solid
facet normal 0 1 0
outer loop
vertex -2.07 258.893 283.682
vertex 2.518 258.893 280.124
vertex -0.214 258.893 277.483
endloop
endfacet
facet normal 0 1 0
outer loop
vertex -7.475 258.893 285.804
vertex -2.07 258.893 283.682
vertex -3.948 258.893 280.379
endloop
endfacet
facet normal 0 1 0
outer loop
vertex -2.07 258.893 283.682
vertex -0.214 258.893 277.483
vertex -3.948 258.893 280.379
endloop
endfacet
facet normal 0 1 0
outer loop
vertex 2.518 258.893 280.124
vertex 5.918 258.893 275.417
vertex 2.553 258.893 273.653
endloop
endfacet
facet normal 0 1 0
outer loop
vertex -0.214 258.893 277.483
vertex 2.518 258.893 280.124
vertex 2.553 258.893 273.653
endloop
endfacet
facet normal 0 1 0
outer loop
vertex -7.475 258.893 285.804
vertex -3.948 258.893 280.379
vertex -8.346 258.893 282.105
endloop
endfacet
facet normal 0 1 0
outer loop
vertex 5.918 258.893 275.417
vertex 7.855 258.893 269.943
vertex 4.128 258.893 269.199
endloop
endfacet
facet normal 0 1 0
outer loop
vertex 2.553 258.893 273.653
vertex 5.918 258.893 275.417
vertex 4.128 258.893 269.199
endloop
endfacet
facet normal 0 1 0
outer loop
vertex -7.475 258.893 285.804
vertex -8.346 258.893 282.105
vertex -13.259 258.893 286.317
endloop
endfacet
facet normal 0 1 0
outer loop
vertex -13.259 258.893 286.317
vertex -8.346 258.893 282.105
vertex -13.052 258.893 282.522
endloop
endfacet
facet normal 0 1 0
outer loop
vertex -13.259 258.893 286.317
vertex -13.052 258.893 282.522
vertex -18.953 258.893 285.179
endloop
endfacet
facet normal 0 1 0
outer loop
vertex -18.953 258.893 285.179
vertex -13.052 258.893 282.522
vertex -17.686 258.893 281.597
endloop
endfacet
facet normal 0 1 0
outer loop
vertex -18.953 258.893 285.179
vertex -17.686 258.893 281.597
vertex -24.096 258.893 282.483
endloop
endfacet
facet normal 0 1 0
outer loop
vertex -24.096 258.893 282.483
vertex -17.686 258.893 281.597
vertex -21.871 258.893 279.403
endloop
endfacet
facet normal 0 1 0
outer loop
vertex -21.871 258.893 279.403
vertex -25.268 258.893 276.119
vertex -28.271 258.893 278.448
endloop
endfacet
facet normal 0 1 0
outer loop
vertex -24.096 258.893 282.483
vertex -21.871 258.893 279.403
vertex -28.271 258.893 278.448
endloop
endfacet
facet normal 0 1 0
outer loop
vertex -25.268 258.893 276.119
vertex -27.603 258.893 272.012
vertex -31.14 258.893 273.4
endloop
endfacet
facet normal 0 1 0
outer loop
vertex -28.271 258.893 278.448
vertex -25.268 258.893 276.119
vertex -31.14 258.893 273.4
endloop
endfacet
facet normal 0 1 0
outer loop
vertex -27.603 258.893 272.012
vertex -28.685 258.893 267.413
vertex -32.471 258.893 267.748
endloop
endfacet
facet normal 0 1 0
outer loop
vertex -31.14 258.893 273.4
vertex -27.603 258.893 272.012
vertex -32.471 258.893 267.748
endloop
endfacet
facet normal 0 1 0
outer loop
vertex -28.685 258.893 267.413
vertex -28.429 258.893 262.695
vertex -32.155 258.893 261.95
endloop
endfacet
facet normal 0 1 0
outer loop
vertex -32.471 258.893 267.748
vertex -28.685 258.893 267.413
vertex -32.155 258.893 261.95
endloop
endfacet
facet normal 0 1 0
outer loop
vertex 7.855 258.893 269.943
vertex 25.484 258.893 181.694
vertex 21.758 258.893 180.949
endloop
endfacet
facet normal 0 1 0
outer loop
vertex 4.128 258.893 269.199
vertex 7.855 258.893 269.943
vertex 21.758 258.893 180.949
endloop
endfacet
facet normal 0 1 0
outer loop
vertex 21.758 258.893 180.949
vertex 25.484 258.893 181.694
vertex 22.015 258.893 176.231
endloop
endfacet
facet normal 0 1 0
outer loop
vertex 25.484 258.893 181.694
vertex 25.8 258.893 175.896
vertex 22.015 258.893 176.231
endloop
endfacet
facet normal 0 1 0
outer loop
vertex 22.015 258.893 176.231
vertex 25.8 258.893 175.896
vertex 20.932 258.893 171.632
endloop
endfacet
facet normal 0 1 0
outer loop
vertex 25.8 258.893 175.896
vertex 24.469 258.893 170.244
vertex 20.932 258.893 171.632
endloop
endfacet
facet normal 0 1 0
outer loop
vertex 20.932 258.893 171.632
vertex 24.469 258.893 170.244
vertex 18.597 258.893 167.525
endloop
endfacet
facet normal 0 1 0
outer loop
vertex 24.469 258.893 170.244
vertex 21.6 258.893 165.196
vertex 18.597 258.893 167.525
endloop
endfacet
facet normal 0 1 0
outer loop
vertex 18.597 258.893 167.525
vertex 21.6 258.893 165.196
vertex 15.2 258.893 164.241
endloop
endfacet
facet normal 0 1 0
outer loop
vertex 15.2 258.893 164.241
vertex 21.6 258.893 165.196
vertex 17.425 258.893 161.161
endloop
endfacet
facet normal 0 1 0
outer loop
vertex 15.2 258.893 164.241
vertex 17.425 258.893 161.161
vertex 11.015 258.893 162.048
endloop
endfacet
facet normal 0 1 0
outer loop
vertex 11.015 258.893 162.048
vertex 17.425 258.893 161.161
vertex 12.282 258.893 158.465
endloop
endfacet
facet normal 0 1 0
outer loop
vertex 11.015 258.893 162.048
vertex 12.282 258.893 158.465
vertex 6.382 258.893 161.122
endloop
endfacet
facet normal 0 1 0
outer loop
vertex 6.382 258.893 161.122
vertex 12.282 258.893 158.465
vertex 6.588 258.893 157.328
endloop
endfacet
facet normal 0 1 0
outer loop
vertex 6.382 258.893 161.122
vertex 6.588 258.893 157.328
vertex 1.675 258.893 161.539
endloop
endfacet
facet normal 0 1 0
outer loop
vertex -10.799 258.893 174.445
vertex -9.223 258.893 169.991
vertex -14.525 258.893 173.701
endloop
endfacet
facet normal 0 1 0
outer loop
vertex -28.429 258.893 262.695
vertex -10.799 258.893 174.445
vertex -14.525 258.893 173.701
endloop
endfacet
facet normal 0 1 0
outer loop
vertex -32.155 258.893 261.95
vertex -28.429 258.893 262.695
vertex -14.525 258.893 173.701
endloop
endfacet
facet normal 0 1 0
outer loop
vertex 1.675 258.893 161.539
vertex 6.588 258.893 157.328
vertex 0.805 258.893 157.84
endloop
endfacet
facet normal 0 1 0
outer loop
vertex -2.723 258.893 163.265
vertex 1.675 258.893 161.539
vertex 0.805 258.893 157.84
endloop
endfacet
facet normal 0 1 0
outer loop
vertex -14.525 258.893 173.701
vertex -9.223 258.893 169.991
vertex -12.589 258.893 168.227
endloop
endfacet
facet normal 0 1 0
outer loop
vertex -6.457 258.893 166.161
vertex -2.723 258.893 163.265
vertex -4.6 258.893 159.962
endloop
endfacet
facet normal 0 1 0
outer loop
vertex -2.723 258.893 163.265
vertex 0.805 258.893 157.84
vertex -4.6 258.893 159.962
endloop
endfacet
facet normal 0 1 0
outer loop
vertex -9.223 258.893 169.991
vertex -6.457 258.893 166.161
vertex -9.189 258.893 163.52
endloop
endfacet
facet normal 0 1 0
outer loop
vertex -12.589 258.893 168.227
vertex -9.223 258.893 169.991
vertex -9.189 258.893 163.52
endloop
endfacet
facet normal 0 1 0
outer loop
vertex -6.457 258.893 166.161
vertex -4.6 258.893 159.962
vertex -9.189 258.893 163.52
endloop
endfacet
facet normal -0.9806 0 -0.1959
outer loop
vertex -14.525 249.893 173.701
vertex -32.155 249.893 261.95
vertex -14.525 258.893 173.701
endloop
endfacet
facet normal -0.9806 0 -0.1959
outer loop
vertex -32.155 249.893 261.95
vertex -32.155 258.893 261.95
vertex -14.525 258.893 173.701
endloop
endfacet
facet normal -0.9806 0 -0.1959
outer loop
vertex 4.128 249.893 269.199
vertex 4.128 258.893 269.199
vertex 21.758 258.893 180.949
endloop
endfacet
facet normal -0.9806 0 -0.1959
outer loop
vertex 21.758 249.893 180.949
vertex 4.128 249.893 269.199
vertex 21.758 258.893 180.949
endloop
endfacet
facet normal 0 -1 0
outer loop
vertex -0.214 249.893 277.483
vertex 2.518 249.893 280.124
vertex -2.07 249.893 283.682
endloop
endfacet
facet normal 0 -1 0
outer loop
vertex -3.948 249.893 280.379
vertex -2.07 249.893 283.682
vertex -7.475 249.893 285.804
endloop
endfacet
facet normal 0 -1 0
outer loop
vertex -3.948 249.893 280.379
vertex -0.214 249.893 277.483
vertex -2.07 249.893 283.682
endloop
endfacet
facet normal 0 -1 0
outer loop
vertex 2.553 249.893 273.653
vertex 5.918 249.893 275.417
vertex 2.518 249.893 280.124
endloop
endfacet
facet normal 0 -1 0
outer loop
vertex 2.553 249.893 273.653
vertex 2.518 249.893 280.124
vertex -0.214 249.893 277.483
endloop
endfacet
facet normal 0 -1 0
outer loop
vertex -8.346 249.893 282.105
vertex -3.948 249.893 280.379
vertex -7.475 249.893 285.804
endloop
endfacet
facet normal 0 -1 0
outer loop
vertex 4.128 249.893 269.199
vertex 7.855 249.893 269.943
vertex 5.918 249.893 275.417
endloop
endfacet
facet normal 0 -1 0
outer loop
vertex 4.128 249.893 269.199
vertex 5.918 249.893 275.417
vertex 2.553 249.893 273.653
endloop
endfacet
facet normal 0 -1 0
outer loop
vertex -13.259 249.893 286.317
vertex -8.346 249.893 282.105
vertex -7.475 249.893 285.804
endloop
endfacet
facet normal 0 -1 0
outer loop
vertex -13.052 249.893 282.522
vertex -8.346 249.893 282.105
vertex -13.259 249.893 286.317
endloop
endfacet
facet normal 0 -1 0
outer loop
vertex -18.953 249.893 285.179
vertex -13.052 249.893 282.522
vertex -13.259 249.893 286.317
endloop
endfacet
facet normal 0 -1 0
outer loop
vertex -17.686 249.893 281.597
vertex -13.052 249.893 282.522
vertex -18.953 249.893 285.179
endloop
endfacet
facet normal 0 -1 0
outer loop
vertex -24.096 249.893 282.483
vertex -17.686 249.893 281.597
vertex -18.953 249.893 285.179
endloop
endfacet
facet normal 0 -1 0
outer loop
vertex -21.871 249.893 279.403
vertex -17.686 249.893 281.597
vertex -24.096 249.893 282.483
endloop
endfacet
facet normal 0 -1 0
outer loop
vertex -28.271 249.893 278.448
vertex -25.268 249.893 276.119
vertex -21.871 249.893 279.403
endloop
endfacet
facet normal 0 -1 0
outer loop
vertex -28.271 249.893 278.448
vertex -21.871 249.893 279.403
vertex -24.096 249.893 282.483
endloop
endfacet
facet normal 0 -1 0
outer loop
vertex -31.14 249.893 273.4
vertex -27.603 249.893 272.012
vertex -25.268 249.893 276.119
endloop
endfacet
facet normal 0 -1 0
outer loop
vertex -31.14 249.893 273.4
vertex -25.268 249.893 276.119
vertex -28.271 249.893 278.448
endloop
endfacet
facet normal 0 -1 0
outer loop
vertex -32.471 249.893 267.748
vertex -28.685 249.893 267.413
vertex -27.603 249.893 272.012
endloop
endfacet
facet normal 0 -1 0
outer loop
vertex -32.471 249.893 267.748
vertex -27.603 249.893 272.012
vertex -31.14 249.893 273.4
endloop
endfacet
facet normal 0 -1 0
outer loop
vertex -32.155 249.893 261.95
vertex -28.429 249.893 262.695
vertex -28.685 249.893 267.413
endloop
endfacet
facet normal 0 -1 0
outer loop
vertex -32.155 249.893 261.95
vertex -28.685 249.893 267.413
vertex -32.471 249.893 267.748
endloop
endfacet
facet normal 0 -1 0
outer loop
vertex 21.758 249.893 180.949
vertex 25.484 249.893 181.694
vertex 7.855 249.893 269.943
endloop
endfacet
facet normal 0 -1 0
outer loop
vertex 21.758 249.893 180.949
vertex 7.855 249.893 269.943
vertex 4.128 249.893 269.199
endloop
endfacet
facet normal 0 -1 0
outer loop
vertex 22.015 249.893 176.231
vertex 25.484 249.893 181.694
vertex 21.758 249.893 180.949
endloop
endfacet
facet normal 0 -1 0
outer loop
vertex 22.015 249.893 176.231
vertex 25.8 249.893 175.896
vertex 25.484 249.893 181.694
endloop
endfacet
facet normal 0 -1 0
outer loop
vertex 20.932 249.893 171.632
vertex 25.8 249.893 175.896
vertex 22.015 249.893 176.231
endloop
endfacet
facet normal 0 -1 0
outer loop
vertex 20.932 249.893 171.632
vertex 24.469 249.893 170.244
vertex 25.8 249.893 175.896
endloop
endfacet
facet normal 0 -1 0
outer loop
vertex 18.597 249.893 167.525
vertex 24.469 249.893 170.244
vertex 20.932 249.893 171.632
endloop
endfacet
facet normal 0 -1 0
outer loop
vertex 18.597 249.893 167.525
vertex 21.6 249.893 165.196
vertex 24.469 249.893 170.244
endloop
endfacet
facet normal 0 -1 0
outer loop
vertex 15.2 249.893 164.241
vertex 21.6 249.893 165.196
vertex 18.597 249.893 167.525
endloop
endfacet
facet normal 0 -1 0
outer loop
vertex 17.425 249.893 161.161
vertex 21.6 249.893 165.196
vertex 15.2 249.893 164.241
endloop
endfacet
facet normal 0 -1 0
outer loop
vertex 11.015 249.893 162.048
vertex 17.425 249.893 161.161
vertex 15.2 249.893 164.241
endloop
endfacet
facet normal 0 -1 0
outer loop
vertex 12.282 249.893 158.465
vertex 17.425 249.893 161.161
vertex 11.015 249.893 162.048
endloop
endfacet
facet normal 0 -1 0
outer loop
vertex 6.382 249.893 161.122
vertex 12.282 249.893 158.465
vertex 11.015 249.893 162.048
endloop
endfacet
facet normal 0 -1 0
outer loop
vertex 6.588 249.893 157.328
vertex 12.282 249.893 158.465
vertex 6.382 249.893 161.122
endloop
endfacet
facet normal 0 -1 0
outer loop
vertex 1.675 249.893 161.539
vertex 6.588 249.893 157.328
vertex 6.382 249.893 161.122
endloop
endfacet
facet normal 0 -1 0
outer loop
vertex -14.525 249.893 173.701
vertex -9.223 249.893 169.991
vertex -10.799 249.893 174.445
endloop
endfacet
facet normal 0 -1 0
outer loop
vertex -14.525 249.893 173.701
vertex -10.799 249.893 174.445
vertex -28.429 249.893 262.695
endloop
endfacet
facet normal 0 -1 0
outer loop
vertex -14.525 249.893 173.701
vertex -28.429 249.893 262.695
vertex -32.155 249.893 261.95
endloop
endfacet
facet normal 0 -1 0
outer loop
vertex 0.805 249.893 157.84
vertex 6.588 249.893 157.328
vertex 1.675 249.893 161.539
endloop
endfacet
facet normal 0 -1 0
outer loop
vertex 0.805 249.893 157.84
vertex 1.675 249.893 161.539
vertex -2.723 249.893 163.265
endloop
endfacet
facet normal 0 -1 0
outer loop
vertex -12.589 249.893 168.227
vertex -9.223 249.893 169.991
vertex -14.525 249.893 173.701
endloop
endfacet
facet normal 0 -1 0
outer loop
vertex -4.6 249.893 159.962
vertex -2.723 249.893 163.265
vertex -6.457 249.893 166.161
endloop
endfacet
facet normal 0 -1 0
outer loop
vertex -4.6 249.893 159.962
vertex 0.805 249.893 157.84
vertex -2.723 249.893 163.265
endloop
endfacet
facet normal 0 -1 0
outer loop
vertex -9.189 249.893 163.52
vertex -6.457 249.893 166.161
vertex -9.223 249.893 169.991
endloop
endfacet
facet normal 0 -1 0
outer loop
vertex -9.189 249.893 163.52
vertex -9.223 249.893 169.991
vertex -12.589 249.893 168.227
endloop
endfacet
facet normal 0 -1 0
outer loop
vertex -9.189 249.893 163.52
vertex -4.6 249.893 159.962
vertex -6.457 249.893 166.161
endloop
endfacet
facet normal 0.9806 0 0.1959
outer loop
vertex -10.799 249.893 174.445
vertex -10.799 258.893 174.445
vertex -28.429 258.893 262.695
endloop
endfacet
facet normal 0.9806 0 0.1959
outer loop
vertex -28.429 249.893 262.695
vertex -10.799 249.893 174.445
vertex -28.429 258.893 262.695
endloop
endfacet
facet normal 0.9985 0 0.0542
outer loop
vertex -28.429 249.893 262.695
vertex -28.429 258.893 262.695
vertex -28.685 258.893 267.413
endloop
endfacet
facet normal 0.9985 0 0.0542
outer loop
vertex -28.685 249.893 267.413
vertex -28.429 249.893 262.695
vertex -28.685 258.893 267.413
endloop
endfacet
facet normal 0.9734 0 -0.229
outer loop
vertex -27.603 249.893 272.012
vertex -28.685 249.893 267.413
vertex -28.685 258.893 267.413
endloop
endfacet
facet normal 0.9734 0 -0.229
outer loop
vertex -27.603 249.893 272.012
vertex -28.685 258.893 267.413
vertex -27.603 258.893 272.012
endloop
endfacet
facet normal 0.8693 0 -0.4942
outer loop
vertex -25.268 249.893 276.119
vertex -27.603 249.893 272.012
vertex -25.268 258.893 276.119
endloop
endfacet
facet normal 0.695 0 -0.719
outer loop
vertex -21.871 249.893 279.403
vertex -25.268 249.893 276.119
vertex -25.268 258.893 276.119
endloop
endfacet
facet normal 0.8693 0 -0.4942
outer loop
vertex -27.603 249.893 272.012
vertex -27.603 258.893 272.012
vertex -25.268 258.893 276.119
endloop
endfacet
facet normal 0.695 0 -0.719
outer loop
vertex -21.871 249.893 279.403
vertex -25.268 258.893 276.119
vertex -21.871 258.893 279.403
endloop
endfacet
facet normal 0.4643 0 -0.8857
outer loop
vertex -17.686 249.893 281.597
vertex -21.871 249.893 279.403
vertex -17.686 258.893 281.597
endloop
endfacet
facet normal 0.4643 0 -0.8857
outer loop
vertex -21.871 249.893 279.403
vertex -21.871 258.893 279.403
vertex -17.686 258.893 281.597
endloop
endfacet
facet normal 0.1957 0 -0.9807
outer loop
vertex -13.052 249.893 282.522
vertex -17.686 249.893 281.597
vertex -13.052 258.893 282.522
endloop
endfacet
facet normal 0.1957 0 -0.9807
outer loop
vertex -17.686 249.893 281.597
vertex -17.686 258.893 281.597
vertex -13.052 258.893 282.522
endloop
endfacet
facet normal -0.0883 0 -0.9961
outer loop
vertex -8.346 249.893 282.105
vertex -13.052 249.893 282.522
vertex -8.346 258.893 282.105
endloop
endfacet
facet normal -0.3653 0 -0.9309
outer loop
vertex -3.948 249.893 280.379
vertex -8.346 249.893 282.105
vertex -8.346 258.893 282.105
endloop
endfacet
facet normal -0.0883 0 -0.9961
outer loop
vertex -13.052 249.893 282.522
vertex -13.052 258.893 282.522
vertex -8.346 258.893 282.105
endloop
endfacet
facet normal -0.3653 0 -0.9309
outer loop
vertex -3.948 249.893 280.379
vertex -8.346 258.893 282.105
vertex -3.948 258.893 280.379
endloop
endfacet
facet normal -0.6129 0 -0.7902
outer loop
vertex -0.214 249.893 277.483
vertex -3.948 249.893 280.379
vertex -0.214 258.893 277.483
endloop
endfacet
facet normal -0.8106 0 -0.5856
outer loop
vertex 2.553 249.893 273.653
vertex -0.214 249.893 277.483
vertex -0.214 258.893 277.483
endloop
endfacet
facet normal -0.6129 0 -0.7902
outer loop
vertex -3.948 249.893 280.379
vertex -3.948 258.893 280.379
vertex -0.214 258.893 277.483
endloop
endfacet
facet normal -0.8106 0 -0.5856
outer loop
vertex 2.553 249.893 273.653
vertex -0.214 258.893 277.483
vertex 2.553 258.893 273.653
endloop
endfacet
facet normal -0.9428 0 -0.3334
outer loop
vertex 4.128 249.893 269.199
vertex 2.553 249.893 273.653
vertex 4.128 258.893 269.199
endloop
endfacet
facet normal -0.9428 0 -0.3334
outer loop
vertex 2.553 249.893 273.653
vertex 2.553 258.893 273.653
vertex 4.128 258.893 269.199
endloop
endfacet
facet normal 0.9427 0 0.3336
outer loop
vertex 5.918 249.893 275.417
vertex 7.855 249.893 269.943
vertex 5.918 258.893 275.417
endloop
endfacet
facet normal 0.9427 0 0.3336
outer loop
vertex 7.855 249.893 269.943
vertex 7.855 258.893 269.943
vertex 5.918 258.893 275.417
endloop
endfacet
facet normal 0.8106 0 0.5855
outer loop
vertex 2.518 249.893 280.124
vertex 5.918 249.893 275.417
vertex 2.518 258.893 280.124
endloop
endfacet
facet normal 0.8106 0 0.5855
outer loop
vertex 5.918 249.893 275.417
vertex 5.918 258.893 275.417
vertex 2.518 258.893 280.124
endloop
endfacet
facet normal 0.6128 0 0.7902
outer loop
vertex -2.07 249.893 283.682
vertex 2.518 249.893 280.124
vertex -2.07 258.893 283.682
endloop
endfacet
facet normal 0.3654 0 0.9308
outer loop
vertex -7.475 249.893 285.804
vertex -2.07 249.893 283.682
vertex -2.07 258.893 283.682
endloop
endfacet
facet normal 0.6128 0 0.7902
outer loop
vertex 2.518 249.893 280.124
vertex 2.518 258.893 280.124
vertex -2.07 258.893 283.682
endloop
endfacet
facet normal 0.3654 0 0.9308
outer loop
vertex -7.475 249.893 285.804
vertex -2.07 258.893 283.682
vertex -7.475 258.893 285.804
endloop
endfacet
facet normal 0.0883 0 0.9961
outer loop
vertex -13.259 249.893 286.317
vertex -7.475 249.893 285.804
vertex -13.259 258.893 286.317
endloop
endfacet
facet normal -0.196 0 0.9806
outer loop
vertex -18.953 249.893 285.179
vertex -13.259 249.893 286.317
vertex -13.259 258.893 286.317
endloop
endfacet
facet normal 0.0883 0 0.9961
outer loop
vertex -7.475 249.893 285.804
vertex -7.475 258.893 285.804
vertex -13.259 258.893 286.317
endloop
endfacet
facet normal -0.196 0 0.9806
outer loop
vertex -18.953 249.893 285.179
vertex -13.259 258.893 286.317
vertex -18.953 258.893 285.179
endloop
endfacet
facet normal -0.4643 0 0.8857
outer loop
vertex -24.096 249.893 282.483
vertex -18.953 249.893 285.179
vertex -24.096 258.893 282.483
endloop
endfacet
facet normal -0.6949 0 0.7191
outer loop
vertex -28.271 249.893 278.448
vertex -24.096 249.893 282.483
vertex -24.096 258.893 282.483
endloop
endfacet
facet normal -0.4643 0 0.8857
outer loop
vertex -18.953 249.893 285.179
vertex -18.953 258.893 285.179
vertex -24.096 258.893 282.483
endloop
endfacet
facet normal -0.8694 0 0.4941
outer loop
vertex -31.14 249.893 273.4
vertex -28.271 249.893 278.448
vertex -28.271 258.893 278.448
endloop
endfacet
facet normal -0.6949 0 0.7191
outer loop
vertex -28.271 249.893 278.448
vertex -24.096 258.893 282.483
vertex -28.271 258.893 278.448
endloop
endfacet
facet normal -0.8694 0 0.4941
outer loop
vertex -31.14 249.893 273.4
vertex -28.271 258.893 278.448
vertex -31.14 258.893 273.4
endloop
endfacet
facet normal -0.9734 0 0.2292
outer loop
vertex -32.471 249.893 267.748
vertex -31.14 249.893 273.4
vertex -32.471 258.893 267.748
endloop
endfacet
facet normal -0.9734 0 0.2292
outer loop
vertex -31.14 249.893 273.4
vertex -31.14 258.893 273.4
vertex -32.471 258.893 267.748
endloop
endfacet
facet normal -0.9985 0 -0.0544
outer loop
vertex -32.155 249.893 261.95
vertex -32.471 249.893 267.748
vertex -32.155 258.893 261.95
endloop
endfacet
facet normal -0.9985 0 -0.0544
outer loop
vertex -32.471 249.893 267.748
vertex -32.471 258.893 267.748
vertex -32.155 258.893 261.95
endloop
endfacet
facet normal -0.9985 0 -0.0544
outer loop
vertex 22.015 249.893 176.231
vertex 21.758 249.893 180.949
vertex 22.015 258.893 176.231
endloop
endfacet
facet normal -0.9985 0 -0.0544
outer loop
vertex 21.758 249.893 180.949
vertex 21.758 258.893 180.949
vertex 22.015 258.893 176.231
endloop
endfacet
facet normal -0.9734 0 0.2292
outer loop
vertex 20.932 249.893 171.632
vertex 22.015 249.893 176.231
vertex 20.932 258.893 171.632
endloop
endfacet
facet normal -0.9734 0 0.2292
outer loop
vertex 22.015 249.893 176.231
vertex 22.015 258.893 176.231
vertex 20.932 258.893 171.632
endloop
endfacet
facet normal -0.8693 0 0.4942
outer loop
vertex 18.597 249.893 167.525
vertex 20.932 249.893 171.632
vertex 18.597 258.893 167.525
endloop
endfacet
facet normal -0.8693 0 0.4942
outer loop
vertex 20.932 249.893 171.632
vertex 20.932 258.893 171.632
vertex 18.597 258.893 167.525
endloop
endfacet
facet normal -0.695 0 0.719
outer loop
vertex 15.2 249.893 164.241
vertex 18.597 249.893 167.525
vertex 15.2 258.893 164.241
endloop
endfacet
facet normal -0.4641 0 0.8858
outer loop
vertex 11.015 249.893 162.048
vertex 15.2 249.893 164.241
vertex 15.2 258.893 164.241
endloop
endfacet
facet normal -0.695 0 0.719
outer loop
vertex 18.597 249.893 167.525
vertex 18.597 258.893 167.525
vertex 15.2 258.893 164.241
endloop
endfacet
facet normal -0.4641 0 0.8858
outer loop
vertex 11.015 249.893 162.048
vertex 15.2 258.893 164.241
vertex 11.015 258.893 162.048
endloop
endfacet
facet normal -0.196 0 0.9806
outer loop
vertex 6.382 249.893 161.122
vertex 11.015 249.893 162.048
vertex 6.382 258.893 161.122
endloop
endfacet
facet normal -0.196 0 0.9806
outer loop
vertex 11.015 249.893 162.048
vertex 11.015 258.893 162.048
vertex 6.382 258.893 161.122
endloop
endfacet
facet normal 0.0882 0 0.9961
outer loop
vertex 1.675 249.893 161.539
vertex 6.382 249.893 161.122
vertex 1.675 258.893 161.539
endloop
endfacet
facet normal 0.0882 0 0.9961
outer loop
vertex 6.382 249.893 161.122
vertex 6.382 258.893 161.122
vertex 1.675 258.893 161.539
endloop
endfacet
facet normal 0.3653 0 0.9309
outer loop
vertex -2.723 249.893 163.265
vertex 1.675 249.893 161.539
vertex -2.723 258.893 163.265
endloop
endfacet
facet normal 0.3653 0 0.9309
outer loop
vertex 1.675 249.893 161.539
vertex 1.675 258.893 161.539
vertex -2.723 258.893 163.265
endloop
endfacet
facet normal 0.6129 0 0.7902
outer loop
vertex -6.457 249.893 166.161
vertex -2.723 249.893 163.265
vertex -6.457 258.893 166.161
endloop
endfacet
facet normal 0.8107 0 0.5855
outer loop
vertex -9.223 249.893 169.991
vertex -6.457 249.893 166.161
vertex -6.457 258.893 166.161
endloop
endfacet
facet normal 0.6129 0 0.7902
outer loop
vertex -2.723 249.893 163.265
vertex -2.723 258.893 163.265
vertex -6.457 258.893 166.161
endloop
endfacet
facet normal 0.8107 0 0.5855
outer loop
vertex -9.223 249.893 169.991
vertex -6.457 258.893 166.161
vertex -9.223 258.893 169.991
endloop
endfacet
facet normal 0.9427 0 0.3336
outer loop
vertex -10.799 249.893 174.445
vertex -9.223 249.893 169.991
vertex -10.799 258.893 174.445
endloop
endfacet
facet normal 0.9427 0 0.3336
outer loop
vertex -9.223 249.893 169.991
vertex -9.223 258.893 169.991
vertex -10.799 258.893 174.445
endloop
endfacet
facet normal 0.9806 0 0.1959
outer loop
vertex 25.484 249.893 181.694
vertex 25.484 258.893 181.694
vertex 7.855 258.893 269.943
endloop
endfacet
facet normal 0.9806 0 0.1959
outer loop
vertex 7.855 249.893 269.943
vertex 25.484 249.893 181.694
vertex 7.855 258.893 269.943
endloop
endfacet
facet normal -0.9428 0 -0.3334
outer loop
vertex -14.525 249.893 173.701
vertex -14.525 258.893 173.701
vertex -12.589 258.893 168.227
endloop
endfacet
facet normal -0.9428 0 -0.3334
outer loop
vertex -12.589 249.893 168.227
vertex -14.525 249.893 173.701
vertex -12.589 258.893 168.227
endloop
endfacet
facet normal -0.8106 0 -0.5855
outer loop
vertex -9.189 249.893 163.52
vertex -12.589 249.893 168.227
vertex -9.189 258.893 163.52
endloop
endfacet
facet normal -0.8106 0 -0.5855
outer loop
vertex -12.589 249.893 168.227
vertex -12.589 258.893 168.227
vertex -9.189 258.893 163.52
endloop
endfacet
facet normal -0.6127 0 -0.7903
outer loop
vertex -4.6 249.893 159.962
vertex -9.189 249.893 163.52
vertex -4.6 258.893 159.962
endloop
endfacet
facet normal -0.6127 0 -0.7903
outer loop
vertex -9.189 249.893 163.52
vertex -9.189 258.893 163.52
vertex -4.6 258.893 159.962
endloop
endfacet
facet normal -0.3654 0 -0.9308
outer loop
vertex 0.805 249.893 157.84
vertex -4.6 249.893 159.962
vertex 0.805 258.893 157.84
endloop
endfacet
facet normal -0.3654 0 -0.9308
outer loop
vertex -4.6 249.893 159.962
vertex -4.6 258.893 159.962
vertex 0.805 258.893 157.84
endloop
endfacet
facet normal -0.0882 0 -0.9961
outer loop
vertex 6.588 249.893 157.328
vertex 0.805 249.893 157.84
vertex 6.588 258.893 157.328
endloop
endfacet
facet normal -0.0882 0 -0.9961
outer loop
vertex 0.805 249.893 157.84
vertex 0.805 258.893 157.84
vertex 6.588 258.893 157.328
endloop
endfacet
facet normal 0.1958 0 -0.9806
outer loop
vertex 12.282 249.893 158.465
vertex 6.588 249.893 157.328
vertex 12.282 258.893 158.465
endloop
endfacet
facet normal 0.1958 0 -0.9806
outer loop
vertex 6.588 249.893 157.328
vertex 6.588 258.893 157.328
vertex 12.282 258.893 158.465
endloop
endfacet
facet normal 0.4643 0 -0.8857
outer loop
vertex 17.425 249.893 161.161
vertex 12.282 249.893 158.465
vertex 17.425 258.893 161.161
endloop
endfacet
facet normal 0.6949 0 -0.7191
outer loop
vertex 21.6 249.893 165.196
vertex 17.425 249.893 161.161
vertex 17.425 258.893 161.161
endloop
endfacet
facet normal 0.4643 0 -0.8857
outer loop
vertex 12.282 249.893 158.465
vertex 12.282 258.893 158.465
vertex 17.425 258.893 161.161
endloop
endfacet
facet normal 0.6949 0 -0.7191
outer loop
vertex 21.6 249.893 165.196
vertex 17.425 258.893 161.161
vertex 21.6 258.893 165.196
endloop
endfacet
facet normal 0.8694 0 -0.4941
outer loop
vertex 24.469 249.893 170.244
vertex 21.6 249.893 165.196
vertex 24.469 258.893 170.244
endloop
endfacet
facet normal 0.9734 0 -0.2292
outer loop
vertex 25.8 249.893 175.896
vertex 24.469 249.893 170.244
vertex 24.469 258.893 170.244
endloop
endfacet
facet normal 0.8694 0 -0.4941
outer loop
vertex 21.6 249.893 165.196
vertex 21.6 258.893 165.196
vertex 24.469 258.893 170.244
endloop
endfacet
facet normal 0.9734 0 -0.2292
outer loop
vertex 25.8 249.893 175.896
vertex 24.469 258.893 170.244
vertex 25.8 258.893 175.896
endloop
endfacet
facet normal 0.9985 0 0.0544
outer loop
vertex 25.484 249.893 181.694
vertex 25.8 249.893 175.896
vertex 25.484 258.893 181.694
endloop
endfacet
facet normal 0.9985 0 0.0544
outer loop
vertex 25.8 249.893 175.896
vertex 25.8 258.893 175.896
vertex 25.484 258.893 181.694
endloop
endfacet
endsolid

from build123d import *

# Parameters (mm, degrees)
BOSS_EXTRUDE1_DEPTH = 4.5


with BuildPart() as part:
    # Sketch1 → Boss-Extrude1 (new, symmetric)
    with BuildSketch(Plane(origin=(0, 254.392577481, 0), x_dir=(1, 0, 0), z_dir=(0, 1, 0))):
        with BuildLine():
            Line((25.484273554, -181.693777747), (7.854508283, -269.943103479))
            ThreePointArc((7.854508283, -269.943103479), (-16.146601218, -285.951437018), (-32.154934757, -261.950327517))
            Line((-32.154934757, -261.950327517), (-14.525169486, -173.701001785))
            ThreePointArc((-14.525169486, -173.701001785), (9.475940015, -157.692668245), (25.484273554, -181.693777747))
        make_face()
        with BuildLine():
            ThreePointArc((21.757903859, -180.949352535), (8.731514803, -161.41903794), (-10.798799791, -174.445426997))
            Line((-10.798799791, -174.445426997), (-28.428565062, -262.694752729))
            ThreePointArc((-28.428565062, -262.694752729), (-15.402176006, -282.225067323), (4.128138588, -269.198678267))
            Line((4.128138588, -269.198678267), (21.757903859, -180.949352535))
        make_face(mode=Mode.SUBTRACT)
    extrude(amount=BOSS_EXTRUDE1_DEPTH, both=True)


solid = part.part
